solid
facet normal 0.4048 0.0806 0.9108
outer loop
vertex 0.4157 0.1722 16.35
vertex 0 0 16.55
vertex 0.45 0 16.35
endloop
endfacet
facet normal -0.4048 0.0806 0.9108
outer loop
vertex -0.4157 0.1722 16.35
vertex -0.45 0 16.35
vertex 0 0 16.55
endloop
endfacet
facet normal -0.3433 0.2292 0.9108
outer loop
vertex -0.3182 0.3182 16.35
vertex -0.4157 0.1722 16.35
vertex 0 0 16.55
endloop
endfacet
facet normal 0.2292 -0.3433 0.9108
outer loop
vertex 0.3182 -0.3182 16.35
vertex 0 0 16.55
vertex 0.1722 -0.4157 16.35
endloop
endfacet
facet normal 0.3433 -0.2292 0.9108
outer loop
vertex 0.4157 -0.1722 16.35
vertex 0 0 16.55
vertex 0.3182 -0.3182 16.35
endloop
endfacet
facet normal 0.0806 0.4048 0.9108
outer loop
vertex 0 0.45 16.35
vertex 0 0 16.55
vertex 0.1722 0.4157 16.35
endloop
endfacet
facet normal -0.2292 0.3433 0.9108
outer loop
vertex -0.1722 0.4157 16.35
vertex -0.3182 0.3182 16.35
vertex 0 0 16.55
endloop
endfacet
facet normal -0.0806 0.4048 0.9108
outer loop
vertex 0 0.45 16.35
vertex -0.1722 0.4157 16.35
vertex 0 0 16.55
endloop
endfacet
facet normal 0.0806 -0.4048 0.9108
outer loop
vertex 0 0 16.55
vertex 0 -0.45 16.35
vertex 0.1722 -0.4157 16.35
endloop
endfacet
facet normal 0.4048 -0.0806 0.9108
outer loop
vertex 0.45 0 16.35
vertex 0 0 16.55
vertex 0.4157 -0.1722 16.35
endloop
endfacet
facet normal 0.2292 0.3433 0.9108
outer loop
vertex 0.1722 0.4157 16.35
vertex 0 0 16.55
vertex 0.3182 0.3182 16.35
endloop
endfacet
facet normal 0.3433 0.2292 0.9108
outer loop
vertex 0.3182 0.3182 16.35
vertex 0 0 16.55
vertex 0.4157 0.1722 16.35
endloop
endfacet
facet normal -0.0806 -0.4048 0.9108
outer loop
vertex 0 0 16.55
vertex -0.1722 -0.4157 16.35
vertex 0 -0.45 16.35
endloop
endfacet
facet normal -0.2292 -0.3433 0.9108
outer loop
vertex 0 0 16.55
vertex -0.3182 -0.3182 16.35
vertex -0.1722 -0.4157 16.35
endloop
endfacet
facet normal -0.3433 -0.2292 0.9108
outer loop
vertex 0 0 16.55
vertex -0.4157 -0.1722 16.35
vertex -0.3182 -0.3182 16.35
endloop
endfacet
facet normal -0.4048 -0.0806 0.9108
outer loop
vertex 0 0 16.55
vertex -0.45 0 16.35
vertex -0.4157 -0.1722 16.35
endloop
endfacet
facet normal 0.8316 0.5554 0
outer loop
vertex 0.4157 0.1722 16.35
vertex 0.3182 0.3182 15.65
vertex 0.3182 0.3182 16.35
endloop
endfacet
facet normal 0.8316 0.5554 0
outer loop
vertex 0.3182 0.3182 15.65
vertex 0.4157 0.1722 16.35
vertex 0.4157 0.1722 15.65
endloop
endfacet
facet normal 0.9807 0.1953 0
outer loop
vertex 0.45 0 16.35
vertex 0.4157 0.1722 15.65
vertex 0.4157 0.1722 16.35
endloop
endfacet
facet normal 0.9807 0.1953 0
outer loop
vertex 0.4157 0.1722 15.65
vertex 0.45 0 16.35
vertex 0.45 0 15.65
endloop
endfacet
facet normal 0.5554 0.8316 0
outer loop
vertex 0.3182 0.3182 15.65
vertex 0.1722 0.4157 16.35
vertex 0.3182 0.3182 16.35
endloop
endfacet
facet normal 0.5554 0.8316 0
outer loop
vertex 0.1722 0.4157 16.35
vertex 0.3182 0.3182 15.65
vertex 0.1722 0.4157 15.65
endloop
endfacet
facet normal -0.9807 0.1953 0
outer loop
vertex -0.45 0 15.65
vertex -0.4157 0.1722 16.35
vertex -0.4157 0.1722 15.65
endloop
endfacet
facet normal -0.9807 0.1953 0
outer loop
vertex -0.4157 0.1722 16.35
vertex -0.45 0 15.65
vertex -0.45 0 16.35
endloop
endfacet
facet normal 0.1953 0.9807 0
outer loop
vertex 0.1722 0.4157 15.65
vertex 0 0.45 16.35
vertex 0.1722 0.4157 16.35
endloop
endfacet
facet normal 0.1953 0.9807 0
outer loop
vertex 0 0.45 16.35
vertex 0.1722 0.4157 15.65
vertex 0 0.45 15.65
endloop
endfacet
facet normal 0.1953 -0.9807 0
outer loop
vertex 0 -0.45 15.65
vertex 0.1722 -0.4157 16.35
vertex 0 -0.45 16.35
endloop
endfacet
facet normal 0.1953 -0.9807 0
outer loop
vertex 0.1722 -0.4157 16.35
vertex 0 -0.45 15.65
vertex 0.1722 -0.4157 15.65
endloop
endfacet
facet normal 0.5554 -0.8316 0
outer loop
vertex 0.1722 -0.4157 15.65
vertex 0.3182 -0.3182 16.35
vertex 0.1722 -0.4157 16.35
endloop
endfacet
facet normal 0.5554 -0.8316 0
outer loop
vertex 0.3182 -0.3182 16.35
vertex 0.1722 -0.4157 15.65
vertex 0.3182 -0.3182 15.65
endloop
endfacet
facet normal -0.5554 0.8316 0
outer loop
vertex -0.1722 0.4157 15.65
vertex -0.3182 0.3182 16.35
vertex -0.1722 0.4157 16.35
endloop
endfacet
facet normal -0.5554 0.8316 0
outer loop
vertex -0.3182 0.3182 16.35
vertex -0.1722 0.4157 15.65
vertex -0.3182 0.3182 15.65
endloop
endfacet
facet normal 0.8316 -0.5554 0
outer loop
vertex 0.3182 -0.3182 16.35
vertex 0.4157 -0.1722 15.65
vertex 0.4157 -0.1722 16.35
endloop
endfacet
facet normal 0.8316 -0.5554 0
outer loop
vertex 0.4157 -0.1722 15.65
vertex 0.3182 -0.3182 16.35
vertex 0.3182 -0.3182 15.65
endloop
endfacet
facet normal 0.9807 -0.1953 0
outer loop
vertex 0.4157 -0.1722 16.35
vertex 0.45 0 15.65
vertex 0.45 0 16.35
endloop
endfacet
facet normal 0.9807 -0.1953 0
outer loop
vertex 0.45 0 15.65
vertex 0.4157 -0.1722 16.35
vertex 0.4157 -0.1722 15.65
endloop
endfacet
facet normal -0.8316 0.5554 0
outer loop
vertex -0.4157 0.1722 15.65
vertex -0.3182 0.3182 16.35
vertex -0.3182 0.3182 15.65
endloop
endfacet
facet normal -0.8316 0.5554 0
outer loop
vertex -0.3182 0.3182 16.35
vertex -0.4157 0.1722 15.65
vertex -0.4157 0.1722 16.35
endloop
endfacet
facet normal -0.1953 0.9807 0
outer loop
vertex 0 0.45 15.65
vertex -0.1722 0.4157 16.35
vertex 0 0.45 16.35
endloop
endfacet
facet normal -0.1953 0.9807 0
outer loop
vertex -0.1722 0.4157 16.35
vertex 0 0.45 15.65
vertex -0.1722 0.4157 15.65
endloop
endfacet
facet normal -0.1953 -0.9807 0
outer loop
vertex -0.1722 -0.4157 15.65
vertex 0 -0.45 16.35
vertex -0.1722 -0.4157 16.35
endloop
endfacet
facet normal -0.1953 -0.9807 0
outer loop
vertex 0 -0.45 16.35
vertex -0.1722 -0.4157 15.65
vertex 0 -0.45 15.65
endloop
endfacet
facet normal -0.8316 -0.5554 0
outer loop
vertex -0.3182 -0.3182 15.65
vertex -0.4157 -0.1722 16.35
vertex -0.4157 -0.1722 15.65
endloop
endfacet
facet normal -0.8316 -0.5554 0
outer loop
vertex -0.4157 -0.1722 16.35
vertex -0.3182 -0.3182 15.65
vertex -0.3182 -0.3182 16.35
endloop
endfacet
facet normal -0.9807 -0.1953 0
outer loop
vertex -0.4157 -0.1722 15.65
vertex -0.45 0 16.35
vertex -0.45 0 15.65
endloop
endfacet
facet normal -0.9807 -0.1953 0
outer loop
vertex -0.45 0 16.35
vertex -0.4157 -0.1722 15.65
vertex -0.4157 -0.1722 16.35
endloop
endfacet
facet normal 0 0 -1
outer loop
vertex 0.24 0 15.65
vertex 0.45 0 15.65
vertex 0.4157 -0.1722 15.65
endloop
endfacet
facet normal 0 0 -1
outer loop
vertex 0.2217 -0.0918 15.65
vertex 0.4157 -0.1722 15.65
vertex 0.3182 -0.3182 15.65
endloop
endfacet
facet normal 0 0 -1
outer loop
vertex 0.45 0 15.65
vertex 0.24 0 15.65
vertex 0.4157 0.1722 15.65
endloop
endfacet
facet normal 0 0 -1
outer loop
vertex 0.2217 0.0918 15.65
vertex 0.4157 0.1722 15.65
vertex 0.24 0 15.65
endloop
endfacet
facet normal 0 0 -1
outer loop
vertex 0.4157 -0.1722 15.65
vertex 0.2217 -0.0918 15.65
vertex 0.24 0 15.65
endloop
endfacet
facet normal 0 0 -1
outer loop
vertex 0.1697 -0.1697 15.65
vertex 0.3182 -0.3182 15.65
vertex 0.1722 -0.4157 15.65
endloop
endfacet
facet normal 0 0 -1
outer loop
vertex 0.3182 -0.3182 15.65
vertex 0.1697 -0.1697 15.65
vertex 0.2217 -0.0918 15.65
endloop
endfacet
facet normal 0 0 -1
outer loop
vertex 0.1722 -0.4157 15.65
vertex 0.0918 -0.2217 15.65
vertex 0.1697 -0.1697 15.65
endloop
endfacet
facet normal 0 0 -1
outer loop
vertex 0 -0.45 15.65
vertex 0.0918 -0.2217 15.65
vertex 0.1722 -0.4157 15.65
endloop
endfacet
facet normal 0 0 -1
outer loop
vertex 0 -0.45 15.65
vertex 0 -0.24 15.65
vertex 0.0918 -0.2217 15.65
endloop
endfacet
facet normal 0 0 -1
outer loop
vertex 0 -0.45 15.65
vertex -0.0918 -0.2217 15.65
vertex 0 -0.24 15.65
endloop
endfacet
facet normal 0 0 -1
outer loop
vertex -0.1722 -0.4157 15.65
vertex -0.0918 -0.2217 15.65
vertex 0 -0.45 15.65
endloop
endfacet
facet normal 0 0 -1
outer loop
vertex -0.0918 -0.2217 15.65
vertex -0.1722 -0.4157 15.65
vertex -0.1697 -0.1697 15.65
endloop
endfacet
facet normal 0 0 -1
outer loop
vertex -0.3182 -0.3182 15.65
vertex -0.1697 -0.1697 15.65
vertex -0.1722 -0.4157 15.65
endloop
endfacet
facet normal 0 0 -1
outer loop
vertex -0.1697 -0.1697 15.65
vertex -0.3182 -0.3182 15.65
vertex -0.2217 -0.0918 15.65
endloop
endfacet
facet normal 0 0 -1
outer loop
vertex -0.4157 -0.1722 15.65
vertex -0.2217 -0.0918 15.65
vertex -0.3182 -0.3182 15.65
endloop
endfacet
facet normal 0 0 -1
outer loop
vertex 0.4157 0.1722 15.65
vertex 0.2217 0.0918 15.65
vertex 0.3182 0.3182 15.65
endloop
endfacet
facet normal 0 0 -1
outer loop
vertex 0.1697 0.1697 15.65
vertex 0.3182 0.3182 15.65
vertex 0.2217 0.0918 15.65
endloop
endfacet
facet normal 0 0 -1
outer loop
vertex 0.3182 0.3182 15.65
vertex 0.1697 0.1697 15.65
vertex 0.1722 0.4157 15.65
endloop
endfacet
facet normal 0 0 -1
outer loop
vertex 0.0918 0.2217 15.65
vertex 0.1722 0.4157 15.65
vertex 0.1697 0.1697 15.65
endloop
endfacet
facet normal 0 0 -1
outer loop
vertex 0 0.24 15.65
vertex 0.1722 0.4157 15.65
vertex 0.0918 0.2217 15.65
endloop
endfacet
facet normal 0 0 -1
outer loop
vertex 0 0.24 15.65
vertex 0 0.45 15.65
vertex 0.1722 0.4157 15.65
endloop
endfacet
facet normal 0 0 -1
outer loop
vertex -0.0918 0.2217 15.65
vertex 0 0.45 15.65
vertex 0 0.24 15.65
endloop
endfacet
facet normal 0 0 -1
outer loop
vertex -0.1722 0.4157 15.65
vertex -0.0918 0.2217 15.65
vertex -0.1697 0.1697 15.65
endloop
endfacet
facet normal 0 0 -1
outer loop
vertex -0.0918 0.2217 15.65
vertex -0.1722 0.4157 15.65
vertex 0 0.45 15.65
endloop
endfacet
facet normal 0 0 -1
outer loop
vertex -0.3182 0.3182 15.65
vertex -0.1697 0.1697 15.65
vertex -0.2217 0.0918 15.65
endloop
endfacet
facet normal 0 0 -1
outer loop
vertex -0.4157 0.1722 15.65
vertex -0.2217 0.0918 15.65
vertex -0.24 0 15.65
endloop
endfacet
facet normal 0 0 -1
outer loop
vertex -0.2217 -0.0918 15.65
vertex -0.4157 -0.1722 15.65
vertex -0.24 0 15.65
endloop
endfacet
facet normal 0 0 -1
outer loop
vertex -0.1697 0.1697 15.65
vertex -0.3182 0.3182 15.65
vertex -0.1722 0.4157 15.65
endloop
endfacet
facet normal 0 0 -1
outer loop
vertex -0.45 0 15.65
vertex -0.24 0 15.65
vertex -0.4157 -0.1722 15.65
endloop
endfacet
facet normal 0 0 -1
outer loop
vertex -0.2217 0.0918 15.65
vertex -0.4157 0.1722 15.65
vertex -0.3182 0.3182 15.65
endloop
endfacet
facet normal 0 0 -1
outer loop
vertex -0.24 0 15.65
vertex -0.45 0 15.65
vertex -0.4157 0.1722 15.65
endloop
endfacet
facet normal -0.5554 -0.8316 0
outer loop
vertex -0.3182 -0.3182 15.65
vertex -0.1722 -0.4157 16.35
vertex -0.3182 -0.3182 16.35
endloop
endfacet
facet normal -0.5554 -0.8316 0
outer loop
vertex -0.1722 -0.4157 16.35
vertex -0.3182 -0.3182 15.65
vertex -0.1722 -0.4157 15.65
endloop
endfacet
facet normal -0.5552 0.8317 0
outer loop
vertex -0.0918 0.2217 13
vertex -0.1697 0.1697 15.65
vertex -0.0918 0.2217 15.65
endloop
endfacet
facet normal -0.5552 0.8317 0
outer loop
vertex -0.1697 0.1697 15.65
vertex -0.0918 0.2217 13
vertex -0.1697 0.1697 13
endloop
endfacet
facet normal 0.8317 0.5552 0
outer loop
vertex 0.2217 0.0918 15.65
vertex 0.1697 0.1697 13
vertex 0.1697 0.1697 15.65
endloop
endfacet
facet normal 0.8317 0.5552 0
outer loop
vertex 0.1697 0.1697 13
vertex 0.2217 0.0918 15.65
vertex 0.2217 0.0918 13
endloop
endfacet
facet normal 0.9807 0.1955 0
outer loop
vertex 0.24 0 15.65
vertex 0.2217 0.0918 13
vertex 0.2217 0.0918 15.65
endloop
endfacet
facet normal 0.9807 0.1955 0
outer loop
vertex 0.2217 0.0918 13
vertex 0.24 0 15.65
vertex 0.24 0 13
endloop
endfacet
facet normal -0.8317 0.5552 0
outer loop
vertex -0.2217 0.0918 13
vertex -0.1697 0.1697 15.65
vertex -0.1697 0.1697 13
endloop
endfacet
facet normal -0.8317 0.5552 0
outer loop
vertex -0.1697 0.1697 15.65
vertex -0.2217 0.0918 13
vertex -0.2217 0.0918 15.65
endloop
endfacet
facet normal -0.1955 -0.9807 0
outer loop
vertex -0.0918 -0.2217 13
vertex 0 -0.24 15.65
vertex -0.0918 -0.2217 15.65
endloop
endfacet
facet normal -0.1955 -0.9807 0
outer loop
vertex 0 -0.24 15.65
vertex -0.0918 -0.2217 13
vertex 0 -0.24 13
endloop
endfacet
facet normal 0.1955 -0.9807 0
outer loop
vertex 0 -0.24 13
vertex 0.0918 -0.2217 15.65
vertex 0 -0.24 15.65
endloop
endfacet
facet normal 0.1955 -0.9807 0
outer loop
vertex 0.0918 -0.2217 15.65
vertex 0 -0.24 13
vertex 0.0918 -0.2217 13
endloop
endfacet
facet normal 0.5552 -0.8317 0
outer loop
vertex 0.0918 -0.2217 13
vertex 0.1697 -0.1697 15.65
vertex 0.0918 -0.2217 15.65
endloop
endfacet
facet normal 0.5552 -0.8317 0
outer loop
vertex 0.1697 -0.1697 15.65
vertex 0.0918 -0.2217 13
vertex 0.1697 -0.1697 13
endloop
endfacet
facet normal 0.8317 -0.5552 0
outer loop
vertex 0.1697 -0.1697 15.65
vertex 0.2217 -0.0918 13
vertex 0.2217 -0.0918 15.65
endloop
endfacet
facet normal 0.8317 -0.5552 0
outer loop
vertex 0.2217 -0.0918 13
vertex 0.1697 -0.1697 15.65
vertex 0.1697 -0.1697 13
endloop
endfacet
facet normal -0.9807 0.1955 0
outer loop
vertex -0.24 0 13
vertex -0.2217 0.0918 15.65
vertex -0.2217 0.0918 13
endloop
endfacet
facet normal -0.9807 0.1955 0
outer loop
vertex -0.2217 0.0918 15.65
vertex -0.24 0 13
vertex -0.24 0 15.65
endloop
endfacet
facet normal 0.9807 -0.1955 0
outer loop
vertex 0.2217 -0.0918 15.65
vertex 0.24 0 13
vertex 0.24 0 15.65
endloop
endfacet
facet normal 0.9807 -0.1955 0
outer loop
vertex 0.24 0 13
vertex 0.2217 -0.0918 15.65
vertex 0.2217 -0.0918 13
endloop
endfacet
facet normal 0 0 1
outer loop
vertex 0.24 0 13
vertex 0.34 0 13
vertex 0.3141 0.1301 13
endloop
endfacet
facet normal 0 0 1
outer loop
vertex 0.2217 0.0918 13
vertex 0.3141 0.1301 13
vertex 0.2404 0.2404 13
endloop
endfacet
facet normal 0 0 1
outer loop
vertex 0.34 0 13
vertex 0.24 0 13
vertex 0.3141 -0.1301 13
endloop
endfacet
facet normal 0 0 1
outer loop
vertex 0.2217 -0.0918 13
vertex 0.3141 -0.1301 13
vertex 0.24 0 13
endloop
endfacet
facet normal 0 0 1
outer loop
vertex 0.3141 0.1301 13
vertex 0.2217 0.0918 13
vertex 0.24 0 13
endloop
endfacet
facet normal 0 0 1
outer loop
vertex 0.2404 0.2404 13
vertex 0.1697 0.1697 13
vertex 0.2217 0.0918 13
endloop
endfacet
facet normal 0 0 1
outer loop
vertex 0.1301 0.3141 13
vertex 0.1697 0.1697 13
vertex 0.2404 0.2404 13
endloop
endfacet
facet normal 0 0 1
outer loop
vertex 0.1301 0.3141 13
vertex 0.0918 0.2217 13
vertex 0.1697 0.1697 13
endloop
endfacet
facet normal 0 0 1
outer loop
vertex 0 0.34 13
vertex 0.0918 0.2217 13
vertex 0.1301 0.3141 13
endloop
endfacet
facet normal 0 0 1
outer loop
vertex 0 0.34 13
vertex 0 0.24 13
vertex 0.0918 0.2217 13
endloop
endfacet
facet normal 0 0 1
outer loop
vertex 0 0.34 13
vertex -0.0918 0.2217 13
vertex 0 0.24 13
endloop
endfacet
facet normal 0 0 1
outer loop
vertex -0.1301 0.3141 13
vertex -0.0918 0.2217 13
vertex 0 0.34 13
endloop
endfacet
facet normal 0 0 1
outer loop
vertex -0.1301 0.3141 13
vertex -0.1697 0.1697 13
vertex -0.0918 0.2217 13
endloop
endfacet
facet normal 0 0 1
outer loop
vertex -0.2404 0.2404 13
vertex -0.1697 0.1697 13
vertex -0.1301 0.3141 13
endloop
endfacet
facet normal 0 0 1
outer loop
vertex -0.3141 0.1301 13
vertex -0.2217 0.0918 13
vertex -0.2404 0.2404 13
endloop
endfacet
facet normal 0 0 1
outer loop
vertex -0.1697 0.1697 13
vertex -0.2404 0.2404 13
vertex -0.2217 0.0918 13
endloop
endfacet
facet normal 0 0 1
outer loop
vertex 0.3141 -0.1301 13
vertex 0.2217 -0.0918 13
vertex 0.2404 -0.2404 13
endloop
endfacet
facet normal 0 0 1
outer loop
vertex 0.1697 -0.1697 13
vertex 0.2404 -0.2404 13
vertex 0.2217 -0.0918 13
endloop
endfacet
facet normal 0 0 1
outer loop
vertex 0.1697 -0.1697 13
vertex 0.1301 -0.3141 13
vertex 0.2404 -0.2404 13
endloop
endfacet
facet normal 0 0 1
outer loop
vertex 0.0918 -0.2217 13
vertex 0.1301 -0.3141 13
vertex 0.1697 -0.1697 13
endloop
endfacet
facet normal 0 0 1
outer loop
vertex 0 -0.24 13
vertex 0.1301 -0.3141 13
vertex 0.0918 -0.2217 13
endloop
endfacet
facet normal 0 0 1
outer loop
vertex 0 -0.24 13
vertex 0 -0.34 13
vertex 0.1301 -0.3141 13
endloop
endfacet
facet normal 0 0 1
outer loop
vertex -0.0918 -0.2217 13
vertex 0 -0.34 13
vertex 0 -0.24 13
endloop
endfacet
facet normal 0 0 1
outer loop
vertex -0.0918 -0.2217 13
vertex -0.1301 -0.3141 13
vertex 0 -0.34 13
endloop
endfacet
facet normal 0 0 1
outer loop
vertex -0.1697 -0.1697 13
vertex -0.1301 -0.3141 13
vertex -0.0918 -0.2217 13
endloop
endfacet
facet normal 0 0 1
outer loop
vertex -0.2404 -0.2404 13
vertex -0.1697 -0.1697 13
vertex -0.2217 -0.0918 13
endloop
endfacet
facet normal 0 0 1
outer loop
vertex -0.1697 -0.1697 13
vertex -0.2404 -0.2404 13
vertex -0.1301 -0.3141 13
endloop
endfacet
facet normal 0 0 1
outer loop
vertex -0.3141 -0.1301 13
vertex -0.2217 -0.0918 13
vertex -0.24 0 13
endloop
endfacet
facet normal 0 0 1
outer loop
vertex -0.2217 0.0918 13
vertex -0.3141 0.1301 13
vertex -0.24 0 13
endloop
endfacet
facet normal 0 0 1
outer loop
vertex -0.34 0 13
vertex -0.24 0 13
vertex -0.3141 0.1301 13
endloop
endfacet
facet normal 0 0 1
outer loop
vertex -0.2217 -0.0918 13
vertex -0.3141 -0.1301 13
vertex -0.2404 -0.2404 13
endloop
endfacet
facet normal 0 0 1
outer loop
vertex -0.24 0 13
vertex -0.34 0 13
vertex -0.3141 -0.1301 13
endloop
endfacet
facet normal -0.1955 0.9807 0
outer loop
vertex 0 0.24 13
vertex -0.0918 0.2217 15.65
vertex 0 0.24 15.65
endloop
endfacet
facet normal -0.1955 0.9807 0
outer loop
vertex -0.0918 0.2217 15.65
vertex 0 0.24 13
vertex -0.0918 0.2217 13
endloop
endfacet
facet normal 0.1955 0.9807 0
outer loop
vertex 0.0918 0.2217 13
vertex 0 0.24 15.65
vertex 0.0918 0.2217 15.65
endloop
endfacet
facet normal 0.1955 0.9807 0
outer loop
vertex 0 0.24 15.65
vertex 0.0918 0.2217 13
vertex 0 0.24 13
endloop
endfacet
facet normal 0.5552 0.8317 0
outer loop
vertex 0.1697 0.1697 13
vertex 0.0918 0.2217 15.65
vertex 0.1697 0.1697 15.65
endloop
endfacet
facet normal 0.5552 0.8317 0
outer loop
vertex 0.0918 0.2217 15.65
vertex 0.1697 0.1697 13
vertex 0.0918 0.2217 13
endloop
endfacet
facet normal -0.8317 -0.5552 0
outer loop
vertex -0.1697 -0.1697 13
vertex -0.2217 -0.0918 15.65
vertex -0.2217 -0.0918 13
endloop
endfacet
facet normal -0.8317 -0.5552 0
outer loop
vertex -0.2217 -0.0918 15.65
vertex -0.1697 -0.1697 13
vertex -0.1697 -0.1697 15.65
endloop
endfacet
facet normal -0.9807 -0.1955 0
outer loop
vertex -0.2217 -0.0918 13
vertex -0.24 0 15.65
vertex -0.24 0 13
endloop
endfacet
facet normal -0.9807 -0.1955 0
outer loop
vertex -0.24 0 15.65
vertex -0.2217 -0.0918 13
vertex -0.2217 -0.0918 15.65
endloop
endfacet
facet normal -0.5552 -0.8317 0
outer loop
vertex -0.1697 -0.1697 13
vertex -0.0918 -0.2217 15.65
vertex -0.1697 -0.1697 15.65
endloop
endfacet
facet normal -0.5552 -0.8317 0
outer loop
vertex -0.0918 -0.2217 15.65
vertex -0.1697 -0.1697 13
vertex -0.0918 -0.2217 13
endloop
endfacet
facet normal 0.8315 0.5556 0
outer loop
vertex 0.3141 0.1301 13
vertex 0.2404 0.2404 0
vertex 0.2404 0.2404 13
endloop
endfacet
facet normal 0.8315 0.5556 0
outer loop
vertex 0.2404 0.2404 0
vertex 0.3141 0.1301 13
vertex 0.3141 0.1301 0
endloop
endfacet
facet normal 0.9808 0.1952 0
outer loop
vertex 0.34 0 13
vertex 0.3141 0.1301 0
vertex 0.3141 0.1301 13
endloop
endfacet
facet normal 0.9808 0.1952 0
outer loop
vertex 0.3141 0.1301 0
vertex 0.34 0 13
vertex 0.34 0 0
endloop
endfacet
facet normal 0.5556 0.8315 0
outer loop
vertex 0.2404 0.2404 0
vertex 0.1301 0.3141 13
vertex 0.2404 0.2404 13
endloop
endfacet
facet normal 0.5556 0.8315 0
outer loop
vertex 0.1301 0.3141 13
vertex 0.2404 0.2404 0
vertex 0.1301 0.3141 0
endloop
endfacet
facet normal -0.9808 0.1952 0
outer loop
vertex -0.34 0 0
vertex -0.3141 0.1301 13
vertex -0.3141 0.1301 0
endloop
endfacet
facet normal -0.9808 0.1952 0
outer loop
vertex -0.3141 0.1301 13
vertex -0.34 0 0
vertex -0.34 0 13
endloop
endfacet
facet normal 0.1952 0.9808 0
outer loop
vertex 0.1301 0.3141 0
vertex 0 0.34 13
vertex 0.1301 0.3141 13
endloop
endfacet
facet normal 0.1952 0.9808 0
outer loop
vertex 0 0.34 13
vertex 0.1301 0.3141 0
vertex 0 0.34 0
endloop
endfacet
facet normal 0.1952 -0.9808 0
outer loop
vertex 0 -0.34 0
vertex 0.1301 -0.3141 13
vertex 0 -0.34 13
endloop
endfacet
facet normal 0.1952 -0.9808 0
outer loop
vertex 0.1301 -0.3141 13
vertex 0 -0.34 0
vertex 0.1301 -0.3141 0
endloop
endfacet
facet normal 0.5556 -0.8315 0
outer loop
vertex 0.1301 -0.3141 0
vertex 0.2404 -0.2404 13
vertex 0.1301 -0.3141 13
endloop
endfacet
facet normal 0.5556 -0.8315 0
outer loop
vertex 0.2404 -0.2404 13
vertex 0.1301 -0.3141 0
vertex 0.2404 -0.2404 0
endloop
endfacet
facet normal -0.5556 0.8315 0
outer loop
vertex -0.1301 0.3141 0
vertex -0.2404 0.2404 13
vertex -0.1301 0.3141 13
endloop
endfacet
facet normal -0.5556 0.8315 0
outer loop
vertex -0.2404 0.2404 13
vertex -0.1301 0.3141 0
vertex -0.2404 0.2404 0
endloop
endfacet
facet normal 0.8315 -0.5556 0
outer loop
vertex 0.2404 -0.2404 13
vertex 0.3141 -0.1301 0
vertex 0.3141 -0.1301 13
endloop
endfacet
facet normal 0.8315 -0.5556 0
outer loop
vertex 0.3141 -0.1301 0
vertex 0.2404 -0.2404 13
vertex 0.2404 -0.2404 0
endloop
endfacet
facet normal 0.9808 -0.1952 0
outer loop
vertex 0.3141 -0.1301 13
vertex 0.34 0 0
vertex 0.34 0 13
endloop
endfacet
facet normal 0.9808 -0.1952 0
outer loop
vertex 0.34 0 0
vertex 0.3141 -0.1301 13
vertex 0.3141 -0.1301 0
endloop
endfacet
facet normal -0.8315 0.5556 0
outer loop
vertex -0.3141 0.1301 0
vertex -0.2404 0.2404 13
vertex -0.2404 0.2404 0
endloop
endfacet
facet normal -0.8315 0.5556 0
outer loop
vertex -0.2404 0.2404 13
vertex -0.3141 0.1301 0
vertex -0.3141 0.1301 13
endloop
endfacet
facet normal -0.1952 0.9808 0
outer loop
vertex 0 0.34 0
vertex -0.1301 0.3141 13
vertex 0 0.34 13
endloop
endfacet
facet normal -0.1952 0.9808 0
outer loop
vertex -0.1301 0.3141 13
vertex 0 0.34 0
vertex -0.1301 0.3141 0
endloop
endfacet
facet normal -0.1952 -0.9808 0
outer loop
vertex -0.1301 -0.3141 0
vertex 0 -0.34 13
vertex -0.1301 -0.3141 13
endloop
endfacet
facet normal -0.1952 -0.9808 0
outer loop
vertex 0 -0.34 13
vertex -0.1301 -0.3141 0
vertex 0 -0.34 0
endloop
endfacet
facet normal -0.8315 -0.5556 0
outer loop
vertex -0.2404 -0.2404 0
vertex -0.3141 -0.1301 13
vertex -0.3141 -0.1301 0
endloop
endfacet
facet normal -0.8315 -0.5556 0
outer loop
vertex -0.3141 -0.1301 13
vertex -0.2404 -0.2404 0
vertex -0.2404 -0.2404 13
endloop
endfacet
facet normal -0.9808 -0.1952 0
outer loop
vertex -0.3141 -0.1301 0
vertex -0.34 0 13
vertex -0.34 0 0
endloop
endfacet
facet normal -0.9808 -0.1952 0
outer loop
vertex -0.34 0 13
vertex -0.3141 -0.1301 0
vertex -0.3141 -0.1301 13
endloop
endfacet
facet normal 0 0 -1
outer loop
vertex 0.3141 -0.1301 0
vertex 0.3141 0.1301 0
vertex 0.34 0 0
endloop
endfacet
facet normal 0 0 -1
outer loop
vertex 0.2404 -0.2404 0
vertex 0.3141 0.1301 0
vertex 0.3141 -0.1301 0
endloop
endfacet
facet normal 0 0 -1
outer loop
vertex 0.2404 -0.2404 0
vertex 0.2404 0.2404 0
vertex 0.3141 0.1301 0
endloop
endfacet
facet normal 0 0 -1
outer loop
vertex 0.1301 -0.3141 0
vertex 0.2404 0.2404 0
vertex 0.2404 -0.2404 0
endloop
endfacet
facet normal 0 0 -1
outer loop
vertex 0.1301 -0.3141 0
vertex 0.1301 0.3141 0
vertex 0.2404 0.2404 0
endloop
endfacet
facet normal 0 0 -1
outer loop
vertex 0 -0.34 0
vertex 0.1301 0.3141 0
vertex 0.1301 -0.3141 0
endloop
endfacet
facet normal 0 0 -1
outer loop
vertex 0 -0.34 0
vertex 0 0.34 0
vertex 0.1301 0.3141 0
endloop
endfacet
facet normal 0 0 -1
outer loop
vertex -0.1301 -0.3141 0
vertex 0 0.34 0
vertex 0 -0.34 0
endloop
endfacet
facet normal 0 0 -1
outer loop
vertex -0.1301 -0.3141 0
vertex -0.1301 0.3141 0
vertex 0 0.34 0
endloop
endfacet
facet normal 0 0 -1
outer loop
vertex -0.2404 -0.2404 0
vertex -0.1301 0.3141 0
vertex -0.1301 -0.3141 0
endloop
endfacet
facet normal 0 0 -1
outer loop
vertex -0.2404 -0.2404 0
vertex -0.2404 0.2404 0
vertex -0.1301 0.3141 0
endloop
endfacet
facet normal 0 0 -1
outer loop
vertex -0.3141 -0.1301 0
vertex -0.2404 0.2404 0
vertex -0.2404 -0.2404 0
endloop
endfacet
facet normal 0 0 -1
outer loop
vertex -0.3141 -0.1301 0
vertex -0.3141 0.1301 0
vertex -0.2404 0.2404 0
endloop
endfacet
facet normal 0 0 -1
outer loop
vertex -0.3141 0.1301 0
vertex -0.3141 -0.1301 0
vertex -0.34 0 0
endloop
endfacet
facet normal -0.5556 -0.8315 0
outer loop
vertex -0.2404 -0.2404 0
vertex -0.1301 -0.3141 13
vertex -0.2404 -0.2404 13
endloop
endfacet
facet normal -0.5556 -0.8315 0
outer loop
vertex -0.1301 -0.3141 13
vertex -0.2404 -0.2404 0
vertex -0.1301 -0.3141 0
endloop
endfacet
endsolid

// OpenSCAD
module pogopin(compress = 0.0) {
     $fn = 16;
     h1 = 13.0;
     h2 = 2.65;
     h3 = 0.7;
     color("silver") union() {
	  translate([0,0,h1+h2+h3-compress]) cylinder(h = 0.2, r1 = 0.45, r2 = 0.0);
	  translate([0,0,h1+h2-compress]) cylinder(h = 0.7, r = 0.45);
	  translate([0,0,h1-compress]) cylinder(h=h2, r = 0.24);
     }
     cylinder(r=0.34,h=h1);
}
pogopin();
